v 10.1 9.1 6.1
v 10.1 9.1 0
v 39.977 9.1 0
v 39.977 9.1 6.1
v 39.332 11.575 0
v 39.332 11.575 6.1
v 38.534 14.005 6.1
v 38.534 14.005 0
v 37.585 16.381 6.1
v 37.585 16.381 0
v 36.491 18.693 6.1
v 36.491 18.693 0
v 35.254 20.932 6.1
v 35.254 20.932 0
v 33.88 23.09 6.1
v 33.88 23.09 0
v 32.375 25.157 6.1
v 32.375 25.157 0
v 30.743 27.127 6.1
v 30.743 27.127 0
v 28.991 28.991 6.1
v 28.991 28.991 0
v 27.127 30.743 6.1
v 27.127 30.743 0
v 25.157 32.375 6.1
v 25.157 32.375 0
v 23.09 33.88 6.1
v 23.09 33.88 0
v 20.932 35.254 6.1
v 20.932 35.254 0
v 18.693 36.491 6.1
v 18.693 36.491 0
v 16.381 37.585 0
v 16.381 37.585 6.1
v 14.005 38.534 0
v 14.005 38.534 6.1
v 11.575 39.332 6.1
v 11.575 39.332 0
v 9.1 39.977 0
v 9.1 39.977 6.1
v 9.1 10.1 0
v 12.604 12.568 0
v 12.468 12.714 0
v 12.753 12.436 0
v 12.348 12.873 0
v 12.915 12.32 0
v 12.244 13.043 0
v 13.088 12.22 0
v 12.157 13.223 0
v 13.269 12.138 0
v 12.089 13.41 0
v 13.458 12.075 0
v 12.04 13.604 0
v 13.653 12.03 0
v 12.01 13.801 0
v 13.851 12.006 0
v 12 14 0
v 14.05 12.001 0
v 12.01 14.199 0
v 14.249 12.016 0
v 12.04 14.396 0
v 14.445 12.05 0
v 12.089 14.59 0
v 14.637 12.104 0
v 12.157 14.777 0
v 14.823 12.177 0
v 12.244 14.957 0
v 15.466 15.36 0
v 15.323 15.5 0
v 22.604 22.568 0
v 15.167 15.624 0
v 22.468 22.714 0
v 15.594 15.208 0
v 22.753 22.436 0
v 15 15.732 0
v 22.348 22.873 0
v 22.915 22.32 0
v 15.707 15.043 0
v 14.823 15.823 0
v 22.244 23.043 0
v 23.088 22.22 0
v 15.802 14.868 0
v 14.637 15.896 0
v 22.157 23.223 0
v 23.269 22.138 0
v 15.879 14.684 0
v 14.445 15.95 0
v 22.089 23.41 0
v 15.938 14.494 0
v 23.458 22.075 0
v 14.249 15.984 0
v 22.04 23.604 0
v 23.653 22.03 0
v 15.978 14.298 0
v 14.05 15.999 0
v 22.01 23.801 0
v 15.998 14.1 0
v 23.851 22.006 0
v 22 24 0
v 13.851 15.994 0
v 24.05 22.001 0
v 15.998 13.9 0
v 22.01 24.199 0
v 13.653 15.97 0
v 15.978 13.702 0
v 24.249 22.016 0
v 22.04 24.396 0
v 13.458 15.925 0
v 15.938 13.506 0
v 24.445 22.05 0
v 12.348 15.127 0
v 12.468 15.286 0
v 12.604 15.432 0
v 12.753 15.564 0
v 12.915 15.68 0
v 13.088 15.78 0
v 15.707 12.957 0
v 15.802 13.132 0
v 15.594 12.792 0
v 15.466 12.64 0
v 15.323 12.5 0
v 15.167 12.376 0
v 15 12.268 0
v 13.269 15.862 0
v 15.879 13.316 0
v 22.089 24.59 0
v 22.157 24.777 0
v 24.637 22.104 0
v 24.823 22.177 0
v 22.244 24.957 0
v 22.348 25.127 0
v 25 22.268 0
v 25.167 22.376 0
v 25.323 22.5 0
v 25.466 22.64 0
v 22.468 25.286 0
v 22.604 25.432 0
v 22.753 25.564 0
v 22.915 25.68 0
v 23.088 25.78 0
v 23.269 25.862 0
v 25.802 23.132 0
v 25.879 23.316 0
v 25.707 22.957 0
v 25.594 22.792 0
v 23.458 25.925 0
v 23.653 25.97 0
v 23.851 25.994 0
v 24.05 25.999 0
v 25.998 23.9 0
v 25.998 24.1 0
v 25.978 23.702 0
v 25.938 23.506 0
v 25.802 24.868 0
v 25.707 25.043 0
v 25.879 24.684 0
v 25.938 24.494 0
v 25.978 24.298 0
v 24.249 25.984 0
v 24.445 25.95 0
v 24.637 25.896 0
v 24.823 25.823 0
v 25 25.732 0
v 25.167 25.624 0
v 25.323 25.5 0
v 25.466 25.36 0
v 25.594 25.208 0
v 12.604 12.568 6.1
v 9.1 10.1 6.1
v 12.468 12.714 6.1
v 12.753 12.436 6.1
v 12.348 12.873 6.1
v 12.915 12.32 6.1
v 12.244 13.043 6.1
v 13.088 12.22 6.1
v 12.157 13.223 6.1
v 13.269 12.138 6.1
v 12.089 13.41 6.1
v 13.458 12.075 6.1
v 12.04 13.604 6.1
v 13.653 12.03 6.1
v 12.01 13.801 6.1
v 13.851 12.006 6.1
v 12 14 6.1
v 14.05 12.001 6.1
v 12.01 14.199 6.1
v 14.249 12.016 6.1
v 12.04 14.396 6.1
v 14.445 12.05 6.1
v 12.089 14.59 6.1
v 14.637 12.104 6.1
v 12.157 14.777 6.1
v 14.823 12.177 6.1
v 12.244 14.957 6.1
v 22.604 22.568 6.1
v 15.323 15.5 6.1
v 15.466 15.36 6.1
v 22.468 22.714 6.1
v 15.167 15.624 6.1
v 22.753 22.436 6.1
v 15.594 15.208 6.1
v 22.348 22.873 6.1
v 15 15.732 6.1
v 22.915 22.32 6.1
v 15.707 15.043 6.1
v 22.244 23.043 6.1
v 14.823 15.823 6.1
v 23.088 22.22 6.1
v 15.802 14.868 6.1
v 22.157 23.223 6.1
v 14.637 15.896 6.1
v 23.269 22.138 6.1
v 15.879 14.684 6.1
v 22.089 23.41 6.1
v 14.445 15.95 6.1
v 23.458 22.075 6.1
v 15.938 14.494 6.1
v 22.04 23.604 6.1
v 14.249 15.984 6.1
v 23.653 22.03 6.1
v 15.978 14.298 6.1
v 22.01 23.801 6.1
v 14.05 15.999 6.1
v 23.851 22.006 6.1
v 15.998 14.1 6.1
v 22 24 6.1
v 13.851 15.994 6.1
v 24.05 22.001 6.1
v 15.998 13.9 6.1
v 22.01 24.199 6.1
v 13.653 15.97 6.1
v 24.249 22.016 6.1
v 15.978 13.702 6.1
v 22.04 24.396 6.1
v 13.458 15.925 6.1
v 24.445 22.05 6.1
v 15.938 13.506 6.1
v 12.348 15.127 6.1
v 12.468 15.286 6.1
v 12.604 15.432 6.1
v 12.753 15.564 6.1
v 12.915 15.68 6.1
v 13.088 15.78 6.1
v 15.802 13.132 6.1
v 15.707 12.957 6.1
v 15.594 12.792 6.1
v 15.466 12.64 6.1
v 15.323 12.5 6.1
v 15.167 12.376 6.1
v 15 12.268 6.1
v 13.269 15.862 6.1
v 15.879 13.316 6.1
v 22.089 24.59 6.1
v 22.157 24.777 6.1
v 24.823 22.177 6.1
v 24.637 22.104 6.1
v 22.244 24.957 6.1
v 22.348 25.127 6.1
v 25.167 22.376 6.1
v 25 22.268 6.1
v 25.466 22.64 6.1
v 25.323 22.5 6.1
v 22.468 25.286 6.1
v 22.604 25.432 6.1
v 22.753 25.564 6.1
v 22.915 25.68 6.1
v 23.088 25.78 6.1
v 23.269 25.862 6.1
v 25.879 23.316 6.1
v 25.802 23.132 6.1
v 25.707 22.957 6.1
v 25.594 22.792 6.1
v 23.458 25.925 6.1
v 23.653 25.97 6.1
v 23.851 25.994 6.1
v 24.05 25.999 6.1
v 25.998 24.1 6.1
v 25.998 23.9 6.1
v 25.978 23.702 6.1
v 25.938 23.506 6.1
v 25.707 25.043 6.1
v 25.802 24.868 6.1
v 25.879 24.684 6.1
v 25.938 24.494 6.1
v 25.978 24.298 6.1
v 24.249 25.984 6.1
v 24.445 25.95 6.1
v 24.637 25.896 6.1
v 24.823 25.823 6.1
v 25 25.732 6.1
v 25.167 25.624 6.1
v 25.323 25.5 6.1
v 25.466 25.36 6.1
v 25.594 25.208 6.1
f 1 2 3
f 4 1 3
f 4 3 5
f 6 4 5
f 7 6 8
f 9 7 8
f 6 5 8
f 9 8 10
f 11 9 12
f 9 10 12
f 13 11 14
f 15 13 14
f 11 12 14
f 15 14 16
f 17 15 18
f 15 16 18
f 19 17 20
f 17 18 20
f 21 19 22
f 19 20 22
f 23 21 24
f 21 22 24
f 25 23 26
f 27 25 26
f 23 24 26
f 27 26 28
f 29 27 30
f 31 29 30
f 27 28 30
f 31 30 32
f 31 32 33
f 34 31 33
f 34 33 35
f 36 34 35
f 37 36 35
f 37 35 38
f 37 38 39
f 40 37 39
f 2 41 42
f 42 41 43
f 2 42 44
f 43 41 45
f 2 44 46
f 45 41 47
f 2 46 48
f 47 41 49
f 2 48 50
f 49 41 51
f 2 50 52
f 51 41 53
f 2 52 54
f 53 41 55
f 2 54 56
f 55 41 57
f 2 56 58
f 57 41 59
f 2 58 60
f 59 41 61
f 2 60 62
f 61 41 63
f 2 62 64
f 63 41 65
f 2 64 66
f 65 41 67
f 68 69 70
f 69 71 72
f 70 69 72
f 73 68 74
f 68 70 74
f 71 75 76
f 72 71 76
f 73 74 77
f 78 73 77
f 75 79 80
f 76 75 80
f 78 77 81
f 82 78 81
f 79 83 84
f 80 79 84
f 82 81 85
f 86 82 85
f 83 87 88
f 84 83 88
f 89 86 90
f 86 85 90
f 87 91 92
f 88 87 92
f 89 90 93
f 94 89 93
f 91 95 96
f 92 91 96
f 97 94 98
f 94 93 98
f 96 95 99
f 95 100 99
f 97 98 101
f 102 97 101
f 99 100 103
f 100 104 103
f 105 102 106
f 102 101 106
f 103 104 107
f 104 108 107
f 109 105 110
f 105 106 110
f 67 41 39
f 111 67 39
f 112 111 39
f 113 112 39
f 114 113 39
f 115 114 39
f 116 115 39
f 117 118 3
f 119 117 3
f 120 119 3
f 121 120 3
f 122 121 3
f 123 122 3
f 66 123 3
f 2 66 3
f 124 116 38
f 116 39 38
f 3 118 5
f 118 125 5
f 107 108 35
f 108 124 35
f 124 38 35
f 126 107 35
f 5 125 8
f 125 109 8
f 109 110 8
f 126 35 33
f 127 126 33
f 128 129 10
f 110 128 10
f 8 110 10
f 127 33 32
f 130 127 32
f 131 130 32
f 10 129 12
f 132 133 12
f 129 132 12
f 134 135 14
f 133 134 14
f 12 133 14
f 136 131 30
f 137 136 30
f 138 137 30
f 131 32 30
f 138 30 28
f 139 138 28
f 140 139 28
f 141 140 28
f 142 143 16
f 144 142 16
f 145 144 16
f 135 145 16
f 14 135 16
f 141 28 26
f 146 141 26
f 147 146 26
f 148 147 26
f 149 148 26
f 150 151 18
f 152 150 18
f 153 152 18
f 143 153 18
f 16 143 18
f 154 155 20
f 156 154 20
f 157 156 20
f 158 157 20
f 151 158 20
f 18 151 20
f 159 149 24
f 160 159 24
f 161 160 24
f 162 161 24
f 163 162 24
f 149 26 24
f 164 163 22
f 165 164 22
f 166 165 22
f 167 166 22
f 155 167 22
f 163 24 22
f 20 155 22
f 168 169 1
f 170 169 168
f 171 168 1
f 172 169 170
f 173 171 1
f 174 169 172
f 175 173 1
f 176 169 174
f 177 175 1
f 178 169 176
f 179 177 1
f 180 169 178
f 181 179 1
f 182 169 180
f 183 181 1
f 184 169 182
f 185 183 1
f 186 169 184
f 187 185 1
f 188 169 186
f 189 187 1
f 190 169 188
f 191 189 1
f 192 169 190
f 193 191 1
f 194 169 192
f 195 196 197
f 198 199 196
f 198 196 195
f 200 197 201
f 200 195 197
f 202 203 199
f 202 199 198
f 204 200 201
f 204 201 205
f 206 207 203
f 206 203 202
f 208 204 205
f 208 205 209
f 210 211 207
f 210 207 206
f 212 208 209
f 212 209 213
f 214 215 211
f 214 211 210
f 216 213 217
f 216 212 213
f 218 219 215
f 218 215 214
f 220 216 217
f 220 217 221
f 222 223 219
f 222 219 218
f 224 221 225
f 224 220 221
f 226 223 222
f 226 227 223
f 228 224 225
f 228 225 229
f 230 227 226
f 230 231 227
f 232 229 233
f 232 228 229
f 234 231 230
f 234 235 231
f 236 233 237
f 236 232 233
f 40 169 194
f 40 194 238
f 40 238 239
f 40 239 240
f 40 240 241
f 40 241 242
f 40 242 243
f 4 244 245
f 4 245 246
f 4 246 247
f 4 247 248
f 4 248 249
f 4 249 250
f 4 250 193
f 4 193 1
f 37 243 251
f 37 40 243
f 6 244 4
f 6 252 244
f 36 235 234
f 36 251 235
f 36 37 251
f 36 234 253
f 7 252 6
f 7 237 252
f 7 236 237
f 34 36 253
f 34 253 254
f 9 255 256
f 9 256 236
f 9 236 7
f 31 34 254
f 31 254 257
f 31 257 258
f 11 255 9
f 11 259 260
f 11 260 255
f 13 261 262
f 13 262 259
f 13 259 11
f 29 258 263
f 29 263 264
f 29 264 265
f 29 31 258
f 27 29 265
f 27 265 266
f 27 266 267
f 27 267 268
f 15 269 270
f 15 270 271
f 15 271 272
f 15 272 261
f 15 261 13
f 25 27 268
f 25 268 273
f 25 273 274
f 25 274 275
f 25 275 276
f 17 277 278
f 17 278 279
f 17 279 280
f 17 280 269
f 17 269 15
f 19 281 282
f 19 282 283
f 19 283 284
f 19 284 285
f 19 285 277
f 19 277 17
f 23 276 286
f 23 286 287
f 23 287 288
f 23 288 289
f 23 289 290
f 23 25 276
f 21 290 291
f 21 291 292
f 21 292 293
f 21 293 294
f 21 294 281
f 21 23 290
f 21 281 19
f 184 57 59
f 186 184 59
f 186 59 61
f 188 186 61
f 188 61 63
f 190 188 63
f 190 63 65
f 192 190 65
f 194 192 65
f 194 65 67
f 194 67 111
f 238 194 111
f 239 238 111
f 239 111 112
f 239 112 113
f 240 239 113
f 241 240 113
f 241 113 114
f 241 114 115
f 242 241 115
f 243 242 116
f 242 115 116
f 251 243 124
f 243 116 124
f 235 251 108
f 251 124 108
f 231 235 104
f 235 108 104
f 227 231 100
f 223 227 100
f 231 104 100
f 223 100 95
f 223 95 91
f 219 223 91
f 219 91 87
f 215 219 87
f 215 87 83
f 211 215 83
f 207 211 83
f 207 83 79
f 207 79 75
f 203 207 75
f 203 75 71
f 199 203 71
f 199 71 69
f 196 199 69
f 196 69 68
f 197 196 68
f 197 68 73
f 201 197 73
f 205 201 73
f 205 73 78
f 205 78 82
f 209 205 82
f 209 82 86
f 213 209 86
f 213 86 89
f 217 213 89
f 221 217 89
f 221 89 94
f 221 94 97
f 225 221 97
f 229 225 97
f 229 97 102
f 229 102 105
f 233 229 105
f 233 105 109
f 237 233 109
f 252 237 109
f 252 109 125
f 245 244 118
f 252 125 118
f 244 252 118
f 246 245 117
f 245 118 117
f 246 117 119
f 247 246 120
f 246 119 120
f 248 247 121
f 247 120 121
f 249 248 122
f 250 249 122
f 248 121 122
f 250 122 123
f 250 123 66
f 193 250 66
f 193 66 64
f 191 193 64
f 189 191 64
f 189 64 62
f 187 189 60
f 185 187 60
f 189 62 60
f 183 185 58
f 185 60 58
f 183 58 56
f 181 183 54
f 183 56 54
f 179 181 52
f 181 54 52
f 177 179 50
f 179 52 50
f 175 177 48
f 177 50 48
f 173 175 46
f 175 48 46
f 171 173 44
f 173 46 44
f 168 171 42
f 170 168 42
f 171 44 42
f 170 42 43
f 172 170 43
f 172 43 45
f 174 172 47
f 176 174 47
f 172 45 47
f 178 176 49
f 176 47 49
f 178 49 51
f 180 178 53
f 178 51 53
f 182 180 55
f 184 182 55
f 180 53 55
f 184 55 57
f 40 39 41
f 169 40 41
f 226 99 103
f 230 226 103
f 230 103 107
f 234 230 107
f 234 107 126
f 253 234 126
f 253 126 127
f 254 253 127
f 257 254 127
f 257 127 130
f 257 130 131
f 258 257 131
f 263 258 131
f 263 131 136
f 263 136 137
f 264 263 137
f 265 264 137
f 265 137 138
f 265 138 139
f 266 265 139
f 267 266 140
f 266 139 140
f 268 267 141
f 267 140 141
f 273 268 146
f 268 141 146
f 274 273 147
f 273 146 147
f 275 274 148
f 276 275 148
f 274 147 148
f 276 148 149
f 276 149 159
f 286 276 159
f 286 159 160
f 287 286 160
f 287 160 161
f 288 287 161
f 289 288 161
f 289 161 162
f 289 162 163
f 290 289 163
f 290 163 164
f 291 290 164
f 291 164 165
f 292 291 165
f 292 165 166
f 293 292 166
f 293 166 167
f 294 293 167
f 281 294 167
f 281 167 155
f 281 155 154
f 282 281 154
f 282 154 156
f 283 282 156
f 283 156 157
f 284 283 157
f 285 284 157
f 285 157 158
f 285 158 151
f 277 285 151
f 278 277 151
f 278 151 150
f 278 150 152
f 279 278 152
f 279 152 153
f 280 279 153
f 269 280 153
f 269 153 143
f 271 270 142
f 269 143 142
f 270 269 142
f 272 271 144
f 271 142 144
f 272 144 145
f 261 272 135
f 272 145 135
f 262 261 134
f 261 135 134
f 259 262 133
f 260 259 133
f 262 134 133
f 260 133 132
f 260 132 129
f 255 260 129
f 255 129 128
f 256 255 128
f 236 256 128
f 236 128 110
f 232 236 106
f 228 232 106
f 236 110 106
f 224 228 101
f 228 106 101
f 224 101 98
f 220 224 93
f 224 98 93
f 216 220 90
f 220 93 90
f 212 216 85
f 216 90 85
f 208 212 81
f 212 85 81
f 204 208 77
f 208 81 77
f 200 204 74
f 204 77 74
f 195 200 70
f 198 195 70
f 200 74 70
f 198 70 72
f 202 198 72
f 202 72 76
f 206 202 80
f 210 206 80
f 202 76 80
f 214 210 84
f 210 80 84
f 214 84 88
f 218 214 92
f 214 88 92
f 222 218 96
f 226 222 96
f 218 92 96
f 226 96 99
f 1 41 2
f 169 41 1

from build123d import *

# Parameters (mm, degrees)
F1_DEPTH = 6.1
F3_D     = 4
F4_SIZE  = 1


with BuildPart() as f1:
    # F0 (on Top) → F1 (new body)
    with BuildSketch(Plane.XY):
        with BuildLine():
            Line((9.1, 9.1), (39.977369, 9.1))
            ThreePointArc((39.977369, 9.1), (28.991378, 28.991378), (9.1, 39.977369))
            Line((9.1, 39.977369), (9.1, 9.1))
        make_face()
    extrude(amount=F1_DEPTH)

    # F3 (through all)
    with Locations(Plane.XY.offset(6.1)):
        with Locations((14, 14), (24, 24)):
            Hole(F3_D / 2)

    # F4
    f4_edges = [f1.edges().sort_by_distance(p)[0] for p in [
        (9.1, 9.1, 3.05),
    ]]
    chamfer(f4_edges, length=F4_SIZE)


solid = f1.part
